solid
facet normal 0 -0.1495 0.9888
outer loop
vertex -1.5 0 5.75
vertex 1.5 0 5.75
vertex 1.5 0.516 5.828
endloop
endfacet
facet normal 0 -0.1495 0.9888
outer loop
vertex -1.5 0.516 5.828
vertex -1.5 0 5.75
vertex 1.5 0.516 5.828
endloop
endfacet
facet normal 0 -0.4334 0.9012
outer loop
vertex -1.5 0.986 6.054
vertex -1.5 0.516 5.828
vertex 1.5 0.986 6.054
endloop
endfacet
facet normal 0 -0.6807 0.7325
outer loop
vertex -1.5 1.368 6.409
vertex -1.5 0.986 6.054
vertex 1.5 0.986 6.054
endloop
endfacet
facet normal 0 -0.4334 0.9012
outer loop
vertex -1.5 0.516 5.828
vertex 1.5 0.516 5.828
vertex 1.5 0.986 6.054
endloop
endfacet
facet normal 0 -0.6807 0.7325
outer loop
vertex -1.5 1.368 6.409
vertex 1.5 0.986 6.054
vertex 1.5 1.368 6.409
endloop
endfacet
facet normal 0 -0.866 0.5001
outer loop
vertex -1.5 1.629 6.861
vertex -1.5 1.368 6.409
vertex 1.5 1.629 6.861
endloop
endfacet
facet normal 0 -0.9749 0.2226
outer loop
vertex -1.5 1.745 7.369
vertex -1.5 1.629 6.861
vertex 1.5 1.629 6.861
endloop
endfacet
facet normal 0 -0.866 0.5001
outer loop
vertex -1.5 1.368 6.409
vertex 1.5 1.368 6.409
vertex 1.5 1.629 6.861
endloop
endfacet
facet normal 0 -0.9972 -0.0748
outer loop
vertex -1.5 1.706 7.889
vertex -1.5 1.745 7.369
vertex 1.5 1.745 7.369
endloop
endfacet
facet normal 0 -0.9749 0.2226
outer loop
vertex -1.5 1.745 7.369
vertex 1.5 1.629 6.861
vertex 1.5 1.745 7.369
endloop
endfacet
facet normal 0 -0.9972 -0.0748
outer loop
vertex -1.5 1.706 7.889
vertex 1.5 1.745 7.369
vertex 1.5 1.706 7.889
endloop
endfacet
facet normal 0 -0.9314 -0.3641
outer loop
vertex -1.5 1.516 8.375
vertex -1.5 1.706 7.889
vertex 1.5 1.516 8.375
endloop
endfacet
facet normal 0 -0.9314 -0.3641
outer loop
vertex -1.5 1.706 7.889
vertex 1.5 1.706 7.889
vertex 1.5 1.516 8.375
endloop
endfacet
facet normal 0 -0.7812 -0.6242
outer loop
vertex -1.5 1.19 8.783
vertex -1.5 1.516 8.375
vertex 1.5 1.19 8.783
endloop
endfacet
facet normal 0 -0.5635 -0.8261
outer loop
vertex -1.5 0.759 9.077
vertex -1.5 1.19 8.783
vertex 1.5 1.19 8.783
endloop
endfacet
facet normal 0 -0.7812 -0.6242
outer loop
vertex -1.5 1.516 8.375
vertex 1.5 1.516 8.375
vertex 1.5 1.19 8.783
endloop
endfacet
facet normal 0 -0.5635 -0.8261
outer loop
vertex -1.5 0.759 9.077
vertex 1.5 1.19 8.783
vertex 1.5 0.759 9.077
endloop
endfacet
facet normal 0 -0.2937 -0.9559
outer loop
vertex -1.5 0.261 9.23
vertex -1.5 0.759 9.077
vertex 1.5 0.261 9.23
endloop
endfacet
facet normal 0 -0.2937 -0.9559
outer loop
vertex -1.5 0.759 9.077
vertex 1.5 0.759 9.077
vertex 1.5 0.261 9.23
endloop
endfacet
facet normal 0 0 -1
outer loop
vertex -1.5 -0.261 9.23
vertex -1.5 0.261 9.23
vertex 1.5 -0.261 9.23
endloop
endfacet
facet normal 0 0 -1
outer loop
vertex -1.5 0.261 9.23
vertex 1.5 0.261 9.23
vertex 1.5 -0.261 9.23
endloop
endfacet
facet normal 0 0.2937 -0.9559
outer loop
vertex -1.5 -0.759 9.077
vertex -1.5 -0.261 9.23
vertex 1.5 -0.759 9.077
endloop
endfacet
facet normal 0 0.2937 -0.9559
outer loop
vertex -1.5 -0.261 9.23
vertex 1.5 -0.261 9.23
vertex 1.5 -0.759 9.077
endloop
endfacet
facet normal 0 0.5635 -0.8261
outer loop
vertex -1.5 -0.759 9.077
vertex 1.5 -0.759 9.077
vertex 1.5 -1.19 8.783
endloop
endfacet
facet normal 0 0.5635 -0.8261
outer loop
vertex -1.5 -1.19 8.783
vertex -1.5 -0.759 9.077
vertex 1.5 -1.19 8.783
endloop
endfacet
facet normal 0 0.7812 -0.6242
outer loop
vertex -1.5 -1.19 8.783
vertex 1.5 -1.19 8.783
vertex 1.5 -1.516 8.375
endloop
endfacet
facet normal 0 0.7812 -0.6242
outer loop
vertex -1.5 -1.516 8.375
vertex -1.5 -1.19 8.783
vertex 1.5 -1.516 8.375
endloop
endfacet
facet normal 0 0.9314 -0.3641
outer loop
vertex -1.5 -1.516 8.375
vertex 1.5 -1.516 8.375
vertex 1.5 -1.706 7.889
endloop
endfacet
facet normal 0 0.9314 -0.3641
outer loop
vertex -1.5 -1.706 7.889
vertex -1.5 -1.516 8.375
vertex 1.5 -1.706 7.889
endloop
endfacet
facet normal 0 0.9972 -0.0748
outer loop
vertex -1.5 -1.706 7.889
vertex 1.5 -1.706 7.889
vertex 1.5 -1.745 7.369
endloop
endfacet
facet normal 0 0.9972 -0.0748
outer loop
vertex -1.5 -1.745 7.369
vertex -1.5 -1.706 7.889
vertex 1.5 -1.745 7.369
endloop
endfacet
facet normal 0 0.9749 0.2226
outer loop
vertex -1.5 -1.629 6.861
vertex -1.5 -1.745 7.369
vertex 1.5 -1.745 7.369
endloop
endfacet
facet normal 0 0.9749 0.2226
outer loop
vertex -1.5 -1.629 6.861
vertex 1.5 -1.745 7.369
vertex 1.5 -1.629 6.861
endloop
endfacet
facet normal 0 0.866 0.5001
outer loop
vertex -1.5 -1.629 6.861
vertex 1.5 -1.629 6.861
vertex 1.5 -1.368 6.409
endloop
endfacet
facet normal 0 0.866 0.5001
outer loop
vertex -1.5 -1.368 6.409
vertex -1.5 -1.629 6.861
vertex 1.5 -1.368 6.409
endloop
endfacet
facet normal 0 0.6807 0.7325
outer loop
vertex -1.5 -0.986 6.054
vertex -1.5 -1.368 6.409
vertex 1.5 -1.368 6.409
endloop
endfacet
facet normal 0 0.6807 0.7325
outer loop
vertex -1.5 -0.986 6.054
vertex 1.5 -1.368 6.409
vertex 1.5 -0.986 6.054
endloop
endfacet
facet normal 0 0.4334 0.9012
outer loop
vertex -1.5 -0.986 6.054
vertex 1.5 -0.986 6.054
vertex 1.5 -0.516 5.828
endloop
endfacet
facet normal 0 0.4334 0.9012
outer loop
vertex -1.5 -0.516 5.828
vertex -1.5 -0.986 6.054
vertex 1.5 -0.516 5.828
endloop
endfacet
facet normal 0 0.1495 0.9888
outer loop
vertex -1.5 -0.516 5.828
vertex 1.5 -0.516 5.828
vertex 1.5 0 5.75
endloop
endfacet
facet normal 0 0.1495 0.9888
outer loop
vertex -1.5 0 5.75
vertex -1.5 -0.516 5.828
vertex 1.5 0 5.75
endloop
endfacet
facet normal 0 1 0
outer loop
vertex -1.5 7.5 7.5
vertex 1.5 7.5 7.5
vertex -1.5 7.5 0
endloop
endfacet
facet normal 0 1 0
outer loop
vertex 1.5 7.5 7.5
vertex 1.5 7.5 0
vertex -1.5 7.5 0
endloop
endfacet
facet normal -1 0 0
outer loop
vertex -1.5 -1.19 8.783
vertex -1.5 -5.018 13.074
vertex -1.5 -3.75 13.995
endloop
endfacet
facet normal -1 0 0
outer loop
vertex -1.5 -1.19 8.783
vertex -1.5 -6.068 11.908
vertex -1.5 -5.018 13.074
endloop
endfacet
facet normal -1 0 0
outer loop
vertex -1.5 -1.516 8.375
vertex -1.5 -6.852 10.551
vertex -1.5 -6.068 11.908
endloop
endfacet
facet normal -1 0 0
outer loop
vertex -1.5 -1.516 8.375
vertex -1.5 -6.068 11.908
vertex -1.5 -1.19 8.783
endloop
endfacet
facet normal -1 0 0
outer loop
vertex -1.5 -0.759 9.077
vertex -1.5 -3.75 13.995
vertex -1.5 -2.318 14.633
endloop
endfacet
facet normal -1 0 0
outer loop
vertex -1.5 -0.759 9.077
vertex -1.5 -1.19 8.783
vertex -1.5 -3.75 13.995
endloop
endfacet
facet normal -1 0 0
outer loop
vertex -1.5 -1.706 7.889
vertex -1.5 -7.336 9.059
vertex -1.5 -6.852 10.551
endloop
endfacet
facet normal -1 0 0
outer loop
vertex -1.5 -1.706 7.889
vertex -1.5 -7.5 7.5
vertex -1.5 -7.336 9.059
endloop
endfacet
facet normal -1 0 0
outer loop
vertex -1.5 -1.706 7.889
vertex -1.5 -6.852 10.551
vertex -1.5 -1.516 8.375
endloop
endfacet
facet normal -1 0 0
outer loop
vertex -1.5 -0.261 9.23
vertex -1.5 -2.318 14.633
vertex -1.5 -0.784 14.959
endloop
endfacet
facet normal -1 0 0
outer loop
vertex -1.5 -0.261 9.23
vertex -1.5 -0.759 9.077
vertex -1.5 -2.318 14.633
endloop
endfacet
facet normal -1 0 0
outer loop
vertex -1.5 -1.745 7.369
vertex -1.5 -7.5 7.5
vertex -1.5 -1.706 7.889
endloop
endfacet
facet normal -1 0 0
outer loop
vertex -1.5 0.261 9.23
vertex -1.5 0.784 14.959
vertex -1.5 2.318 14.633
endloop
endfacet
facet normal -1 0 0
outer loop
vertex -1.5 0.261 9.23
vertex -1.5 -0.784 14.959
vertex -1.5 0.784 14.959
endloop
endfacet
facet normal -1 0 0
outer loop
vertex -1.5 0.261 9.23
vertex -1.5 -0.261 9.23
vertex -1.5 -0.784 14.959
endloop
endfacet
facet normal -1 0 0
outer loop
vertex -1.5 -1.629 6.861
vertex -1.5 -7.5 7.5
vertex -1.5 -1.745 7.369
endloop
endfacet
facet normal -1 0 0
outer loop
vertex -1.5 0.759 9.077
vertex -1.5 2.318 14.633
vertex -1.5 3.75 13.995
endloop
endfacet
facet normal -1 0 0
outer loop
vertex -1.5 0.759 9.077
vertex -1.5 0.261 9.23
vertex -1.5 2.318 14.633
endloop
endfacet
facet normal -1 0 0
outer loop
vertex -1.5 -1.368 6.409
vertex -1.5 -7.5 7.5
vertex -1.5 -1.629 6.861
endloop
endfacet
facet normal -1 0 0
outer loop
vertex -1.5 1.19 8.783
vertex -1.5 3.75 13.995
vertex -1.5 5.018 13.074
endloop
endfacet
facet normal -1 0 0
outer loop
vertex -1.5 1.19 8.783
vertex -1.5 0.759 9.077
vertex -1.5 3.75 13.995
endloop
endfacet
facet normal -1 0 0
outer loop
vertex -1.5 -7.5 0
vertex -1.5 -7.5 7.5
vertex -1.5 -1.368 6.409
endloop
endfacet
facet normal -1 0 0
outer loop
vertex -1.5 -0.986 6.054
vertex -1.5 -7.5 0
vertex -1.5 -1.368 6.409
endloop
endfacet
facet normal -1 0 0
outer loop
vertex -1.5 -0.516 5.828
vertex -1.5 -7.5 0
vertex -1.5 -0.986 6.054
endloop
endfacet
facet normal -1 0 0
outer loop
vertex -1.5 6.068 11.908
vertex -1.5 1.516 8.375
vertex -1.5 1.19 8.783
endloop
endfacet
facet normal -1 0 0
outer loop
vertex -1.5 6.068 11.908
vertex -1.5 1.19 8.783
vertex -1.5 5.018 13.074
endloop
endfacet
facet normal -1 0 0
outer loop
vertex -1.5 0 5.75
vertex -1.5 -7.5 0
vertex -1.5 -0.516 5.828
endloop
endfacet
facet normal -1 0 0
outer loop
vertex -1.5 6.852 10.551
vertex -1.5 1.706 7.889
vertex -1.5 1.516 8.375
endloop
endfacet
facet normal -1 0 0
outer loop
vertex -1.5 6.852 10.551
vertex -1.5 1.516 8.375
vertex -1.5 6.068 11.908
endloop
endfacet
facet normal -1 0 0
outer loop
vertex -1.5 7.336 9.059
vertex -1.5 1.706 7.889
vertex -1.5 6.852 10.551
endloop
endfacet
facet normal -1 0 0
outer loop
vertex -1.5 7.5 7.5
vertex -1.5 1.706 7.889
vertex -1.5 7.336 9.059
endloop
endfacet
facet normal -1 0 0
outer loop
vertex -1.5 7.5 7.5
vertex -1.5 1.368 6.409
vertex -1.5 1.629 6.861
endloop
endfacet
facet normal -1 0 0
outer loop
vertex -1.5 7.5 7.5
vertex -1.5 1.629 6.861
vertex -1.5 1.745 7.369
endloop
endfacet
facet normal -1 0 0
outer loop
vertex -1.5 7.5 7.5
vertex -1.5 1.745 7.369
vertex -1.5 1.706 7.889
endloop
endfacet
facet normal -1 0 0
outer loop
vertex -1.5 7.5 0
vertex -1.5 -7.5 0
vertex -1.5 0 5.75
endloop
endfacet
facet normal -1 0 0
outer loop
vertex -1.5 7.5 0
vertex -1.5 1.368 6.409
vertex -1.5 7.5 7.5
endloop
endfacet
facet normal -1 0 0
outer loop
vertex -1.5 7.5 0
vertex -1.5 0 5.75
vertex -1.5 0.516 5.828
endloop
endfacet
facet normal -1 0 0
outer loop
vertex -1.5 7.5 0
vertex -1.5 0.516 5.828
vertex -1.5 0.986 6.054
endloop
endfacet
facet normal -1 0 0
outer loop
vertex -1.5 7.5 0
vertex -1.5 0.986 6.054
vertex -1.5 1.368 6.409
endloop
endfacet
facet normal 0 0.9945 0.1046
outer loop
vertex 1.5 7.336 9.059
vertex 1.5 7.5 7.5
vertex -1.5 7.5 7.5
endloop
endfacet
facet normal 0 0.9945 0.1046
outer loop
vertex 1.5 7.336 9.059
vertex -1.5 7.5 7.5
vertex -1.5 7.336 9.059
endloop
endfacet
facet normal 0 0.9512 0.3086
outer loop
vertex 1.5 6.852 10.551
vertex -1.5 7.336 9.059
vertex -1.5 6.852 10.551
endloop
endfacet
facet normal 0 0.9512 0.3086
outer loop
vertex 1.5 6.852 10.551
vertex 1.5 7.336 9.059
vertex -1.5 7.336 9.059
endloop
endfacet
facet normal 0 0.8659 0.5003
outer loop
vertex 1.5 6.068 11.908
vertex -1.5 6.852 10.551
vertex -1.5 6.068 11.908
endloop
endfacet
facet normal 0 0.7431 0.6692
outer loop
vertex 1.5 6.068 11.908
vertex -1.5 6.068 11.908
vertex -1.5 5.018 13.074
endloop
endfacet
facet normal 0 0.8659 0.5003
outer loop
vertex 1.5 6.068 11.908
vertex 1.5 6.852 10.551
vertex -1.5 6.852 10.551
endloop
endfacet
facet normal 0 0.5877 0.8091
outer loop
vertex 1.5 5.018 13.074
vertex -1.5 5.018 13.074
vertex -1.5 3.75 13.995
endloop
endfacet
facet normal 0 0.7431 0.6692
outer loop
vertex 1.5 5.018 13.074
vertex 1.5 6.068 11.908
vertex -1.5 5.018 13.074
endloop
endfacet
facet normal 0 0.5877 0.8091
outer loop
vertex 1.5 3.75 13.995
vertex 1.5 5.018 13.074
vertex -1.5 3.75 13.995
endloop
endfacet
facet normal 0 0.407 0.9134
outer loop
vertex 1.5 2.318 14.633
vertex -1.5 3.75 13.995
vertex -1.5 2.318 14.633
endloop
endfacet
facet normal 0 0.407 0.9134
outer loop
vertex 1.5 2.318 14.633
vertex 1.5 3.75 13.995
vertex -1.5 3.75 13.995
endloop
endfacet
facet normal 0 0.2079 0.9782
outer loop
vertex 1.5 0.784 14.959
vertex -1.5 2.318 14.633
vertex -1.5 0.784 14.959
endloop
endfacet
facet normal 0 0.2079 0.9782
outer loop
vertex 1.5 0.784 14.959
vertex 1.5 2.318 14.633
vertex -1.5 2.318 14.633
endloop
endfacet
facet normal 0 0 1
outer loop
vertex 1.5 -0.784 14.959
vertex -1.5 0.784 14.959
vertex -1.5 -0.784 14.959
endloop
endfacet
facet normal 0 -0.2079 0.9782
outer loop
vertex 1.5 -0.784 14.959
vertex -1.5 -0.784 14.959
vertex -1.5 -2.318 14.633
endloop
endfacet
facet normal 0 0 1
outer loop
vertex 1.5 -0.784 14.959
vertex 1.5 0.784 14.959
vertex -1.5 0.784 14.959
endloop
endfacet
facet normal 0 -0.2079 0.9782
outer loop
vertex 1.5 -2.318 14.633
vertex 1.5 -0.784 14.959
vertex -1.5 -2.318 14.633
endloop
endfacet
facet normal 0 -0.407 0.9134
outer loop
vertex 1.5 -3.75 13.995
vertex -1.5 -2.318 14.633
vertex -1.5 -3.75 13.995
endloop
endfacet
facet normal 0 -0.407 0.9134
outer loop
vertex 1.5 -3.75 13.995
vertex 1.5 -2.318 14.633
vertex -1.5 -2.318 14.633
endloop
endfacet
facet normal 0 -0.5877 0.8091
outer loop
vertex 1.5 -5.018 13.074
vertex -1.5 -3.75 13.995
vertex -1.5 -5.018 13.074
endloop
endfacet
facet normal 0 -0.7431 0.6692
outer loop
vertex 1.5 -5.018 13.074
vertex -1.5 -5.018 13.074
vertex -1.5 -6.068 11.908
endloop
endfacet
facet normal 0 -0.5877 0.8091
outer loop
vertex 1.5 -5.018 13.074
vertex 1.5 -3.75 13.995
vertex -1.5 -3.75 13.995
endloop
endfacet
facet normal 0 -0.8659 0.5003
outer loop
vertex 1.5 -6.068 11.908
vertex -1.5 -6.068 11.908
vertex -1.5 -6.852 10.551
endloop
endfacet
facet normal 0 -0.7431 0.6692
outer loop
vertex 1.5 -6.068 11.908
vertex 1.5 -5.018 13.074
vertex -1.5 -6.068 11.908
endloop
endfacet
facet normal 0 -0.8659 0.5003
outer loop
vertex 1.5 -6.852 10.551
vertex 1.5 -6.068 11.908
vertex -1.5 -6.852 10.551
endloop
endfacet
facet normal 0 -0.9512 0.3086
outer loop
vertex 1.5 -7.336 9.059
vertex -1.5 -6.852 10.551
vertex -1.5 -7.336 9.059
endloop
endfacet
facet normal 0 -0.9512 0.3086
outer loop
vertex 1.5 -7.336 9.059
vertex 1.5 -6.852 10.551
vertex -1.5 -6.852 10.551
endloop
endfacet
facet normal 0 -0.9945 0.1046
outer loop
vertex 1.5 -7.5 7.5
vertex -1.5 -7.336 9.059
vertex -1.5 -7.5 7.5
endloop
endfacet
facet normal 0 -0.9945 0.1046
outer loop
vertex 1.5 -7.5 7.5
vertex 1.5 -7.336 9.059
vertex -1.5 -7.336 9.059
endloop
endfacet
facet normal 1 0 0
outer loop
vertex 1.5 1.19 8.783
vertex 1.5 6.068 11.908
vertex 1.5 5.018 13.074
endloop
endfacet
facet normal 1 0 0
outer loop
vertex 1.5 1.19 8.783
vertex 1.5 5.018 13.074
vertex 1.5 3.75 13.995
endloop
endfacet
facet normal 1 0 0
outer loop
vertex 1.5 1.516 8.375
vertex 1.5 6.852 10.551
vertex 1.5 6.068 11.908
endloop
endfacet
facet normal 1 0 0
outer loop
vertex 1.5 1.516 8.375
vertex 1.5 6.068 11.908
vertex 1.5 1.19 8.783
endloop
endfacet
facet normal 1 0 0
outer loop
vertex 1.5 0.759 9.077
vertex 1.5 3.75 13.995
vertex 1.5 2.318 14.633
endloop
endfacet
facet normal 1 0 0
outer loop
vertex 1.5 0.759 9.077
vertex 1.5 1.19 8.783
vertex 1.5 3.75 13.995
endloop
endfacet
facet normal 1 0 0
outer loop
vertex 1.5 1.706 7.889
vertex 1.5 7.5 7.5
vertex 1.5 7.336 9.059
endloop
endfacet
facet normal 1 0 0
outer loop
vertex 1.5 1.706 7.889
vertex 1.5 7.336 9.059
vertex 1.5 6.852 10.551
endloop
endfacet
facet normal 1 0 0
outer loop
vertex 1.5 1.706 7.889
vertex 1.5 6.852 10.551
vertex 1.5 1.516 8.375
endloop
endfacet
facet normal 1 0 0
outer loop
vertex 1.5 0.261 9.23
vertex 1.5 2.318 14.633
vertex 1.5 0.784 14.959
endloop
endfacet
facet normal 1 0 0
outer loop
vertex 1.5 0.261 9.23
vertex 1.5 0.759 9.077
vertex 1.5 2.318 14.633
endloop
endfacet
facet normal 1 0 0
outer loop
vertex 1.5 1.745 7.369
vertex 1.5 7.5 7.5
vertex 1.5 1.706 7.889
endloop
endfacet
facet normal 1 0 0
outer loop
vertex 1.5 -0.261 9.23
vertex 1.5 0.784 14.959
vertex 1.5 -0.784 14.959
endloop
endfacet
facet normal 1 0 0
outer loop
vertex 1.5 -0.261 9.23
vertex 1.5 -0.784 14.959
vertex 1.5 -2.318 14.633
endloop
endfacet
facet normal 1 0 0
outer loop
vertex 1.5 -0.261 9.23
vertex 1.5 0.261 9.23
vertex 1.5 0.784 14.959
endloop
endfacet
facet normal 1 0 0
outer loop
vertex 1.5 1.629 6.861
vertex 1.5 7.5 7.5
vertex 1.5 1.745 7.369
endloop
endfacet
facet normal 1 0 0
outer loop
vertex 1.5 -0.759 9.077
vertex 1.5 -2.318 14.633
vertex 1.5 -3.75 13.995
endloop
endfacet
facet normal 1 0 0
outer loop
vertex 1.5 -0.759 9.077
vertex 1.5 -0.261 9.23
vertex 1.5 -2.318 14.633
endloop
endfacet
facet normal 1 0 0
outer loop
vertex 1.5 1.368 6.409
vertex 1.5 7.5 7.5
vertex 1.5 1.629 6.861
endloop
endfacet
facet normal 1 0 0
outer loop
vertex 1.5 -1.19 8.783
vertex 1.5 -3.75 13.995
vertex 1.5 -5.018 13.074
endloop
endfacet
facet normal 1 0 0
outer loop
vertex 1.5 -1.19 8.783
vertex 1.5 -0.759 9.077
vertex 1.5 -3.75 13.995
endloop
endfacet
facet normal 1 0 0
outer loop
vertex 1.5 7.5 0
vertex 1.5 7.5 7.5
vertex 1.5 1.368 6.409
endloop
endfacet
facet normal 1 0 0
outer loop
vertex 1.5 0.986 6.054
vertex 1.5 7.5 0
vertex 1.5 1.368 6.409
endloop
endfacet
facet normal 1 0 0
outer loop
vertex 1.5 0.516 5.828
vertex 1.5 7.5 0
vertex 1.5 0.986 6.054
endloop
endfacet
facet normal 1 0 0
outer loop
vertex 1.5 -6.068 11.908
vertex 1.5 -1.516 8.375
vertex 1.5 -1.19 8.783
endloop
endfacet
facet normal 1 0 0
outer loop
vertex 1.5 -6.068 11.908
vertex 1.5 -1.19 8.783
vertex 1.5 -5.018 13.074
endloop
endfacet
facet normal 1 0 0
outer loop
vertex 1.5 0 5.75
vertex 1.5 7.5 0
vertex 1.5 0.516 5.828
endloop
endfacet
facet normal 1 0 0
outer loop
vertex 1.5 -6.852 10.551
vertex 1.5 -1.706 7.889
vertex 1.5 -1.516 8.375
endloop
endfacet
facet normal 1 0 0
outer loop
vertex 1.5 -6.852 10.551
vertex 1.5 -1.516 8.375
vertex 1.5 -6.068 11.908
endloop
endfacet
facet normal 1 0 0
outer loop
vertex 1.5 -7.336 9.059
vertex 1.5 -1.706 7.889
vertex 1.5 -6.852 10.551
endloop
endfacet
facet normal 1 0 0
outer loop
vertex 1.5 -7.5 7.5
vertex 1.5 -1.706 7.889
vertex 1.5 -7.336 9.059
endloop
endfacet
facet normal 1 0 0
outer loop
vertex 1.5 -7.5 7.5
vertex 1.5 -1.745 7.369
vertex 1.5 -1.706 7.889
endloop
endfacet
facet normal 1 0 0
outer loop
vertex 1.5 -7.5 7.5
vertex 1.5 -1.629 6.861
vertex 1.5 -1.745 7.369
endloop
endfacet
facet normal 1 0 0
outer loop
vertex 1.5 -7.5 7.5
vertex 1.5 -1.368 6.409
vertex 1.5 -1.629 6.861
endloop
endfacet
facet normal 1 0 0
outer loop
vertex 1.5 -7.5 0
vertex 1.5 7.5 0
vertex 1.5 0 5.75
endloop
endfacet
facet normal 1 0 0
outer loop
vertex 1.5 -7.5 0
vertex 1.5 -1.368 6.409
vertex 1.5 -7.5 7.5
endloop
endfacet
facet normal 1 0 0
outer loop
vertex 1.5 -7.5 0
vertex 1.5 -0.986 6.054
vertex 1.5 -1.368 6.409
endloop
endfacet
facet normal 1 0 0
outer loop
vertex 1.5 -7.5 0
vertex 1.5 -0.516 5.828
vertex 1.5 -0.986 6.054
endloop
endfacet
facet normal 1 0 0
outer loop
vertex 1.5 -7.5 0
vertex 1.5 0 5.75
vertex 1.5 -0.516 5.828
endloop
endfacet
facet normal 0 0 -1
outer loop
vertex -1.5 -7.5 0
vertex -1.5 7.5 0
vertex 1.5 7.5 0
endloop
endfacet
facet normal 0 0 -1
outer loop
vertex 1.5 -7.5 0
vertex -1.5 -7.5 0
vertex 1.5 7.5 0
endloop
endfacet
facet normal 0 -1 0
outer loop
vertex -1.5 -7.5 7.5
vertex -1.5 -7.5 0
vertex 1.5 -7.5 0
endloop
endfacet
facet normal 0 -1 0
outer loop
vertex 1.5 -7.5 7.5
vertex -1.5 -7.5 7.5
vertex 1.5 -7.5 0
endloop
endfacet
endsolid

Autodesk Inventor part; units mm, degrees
ref_plane "YZ Plane" through (0, 0, 0) normal (1, 0, 0) x (0, 1, 0)
ref_plane "XZ Plane" through (0, 0, 0) normal (0, 1, 0) x (-1, 0, 0)
ref_plane "XY Plane" through (0, 0, 0) normal (0, 0, 1) x (1, 0, 0)
sketch "Sketch1" plane through (0, 0, 0) normal (0, 0, 1) x (1, 0, 0)
  line L0 (7.5, 7.5) -> (-7.5, 7.5) projected
  line L1 (-7.5, -7.5) -> (7.5, -7.5) projected
  line L2 (-1.5, 7.5) -> (1.5, 7.5)
  line L3 (1.5, 7.5) -> (1.5, -7.5)
  line L4 (1.5, -7.5) -> (-1.5, -7.5)
  line L5 (-1.5, -7.5) -> (-1.5, 7.5)
  line L6 (-1.5, 7.5) -> (1.5, -7.5) construction
  line L7 (1.5, 7.5) -> (-1.5, -7.5) construction
  point P0 (0, 0)
  dimension "d0" = 3
extrude "Extrusion1" add sketch "Sketch1" along normal blind 15
sketch "Sketch2" plane through (1.5, -7.5, 0) normal (1, 0, 0) x (0, 0, -1)
  line L0 (0, 15) -> (0, 0) projected
  line L1 (0, 15) -> (-15, 15) projected
  line L2 (-15, 0) -> (-15, 15) projected
  line L3 (-15, 15) -> (-7.5, 15)
  line L4 (0, 15) -> (-15, 15) projected
  line L5 (0, 0) -> (-15, 0) projected
  line L6 (0, 0) -> (-15, 0) projected
  arc A0 (-7.5, 15) -> (-7.5, 0) centre (-7.5, 7.5) ccw
  line L7 (-15, 15) -> (-15, 0) projected
  circle A1 centre (-7.5, 7.5) radius 1.75
  point P0 (0, 7.5)
  point P1 (-10, 7.5)
  dimension "d3" = 7.5
  dimension "d7" = 3.5
extrude "Extrusion2" cut sketch "Sketch2" against normal up to next contours A0 L2 L1 | L5 L2 A0 | A1
properties part number "weight_holder_string_loop"
